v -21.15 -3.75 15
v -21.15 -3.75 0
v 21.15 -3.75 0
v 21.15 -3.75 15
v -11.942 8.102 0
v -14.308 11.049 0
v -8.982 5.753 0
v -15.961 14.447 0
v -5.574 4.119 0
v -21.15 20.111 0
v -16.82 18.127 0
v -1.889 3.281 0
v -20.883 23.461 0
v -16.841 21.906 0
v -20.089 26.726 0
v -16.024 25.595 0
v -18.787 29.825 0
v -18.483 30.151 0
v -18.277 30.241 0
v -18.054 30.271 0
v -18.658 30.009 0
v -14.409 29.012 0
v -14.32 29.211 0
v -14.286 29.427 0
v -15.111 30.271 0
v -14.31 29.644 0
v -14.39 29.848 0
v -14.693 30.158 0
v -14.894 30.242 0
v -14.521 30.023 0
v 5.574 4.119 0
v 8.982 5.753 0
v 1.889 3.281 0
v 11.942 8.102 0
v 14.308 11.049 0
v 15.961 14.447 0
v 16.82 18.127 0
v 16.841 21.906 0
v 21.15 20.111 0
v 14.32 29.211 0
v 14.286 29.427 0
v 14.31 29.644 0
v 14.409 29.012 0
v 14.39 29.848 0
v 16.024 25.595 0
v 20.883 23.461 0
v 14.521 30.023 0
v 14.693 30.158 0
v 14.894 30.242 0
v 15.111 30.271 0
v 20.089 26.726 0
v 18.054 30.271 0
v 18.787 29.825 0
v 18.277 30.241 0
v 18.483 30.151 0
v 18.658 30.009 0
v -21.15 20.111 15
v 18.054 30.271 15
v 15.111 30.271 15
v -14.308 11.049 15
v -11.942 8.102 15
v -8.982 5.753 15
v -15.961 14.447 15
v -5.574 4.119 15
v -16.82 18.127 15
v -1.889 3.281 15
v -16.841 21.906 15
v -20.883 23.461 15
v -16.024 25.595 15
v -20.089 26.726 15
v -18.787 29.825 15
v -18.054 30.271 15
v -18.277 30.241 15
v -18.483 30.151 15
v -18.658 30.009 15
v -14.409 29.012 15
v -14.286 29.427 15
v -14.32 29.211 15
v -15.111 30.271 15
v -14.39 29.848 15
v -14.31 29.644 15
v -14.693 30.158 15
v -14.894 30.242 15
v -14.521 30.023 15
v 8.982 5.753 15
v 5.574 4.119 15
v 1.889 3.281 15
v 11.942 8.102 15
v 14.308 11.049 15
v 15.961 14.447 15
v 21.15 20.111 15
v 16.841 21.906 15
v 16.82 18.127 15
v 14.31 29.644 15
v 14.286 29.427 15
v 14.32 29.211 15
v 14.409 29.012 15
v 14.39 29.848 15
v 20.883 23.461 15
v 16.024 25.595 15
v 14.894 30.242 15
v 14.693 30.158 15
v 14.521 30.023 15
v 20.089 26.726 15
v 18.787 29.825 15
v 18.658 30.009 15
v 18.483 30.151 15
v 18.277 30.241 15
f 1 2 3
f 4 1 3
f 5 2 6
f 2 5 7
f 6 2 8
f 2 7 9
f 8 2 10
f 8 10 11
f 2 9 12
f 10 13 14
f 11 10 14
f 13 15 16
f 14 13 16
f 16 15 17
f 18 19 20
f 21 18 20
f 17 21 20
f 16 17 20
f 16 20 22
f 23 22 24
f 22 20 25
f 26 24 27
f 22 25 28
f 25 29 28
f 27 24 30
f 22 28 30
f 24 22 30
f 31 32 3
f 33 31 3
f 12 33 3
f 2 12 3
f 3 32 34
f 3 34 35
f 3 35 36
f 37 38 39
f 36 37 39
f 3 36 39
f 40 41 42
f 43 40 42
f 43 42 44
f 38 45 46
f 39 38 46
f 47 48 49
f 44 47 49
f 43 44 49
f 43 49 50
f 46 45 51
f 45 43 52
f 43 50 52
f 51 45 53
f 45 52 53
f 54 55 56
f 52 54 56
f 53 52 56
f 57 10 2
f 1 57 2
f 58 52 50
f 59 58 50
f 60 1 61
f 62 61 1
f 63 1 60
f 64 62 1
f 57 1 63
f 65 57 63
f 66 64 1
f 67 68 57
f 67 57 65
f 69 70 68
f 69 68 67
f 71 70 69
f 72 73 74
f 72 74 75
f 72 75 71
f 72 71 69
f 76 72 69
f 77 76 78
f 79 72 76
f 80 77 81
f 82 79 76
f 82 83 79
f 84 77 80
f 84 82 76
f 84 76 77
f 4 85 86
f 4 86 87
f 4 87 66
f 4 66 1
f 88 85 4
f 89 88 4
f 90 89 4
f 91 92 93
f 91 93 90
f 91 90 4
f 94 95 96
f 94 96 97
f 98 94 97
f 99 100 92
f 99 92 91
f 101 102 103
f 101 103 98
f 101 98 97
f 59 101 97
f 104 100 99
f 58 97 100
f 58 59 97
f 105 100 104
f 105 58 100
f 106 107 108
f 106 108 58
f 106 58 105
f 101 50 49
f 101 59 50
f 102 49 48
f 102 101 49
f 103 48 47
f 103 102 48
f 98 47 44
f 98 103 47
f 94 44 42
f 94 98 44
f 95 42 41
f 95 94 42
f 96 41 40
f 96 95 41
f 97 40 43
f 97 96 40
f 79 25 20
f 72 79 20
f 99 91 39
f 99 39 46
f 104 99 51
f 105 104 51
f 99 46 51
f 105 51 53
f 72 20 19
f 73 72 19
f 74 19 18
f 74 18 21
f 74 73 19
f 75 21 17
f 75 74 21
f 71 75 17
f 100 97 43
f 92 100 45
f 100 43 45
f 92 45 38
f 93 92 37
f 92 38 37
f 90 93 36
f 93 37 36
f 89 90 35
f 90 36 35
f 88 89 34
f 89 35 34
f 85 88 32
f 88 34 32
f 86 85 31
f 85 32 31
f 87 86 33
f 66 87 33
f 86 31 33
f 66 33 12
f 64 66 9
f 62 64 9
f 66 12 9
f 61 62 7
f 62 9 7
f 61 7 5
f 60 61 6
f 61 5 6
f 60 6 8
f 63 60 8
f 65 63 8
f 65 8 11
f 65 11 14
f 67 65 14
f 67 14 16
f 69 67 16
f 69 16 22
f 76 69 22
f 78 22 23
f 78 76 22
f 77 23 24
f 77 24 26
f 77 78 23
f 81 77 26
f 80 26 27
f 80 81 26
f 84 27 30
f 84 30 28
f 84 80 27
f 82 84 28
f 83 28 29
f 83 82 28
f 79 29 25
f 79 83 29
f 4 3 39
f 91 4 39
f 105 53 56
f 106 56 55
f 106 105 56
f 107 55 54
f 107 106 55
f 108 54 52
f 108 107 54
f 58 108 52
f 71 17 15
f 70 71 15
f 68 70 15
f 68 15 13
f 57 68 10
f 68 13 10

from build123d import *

# Parameters (mm, degrees)
SKETCH1_W           = 42.3
SKETCH1_H           = 3.75
BOSS_EXTRUDE1_DEPTH = 15
FILLET1_R           = 0.8255


with BuildPart() as part:
    # Sketch1 → Boss-Extrude1 (new body)
    with BuildSketch(Plane.XY):
        with BuildLine():
            Line((21.15, 0), (21.15, 20.111200005))
            ThreePointArc((21.15, 20.111200005), (20.489653579, 25.354919699), (18.549849056, 30.271200005))
            Line((18.549849056, 30.271200005), (13.550249835, 30.271200005))
            ThreePointArc((13.550249835, 30.271200005), (0, 3.175), (-13.550249835, 30.271200005))
            Line((-13.550249835, 30.271200005), (-18.549849056, 30.271200005))
            ThreePointArc((-18.549849056, 30.271200005), (-20.489653579, 25.354919699), (-21.15, 20.111200005))
            Line((-21.15, 20.111200005), (-21.15, 0))
            Line((-21.15, 0), (21.15, 0))
        make_face()
        with Locations((0, -1.875)):
            Rectangle(SKETCH1_W, SKETCH1_H)
    extrude(amount=BOSS_EXTRUDE1_DEPTH)

    # Fillet1
    fillet1_edges = [part.edges().sort_by_distance(p)[0] for p in [
        (-18.549849056, 30.271200005, 7.5),
        (-13.550249835, 30.271200005, 7.5),
        (13.550249835, 30.271200005, 7.5),
        (18.549849056, 30.271200005, 7.5),
    ]]
    fillet(fillet1_edges, radius=FILLET1_R)


solid = part.part
